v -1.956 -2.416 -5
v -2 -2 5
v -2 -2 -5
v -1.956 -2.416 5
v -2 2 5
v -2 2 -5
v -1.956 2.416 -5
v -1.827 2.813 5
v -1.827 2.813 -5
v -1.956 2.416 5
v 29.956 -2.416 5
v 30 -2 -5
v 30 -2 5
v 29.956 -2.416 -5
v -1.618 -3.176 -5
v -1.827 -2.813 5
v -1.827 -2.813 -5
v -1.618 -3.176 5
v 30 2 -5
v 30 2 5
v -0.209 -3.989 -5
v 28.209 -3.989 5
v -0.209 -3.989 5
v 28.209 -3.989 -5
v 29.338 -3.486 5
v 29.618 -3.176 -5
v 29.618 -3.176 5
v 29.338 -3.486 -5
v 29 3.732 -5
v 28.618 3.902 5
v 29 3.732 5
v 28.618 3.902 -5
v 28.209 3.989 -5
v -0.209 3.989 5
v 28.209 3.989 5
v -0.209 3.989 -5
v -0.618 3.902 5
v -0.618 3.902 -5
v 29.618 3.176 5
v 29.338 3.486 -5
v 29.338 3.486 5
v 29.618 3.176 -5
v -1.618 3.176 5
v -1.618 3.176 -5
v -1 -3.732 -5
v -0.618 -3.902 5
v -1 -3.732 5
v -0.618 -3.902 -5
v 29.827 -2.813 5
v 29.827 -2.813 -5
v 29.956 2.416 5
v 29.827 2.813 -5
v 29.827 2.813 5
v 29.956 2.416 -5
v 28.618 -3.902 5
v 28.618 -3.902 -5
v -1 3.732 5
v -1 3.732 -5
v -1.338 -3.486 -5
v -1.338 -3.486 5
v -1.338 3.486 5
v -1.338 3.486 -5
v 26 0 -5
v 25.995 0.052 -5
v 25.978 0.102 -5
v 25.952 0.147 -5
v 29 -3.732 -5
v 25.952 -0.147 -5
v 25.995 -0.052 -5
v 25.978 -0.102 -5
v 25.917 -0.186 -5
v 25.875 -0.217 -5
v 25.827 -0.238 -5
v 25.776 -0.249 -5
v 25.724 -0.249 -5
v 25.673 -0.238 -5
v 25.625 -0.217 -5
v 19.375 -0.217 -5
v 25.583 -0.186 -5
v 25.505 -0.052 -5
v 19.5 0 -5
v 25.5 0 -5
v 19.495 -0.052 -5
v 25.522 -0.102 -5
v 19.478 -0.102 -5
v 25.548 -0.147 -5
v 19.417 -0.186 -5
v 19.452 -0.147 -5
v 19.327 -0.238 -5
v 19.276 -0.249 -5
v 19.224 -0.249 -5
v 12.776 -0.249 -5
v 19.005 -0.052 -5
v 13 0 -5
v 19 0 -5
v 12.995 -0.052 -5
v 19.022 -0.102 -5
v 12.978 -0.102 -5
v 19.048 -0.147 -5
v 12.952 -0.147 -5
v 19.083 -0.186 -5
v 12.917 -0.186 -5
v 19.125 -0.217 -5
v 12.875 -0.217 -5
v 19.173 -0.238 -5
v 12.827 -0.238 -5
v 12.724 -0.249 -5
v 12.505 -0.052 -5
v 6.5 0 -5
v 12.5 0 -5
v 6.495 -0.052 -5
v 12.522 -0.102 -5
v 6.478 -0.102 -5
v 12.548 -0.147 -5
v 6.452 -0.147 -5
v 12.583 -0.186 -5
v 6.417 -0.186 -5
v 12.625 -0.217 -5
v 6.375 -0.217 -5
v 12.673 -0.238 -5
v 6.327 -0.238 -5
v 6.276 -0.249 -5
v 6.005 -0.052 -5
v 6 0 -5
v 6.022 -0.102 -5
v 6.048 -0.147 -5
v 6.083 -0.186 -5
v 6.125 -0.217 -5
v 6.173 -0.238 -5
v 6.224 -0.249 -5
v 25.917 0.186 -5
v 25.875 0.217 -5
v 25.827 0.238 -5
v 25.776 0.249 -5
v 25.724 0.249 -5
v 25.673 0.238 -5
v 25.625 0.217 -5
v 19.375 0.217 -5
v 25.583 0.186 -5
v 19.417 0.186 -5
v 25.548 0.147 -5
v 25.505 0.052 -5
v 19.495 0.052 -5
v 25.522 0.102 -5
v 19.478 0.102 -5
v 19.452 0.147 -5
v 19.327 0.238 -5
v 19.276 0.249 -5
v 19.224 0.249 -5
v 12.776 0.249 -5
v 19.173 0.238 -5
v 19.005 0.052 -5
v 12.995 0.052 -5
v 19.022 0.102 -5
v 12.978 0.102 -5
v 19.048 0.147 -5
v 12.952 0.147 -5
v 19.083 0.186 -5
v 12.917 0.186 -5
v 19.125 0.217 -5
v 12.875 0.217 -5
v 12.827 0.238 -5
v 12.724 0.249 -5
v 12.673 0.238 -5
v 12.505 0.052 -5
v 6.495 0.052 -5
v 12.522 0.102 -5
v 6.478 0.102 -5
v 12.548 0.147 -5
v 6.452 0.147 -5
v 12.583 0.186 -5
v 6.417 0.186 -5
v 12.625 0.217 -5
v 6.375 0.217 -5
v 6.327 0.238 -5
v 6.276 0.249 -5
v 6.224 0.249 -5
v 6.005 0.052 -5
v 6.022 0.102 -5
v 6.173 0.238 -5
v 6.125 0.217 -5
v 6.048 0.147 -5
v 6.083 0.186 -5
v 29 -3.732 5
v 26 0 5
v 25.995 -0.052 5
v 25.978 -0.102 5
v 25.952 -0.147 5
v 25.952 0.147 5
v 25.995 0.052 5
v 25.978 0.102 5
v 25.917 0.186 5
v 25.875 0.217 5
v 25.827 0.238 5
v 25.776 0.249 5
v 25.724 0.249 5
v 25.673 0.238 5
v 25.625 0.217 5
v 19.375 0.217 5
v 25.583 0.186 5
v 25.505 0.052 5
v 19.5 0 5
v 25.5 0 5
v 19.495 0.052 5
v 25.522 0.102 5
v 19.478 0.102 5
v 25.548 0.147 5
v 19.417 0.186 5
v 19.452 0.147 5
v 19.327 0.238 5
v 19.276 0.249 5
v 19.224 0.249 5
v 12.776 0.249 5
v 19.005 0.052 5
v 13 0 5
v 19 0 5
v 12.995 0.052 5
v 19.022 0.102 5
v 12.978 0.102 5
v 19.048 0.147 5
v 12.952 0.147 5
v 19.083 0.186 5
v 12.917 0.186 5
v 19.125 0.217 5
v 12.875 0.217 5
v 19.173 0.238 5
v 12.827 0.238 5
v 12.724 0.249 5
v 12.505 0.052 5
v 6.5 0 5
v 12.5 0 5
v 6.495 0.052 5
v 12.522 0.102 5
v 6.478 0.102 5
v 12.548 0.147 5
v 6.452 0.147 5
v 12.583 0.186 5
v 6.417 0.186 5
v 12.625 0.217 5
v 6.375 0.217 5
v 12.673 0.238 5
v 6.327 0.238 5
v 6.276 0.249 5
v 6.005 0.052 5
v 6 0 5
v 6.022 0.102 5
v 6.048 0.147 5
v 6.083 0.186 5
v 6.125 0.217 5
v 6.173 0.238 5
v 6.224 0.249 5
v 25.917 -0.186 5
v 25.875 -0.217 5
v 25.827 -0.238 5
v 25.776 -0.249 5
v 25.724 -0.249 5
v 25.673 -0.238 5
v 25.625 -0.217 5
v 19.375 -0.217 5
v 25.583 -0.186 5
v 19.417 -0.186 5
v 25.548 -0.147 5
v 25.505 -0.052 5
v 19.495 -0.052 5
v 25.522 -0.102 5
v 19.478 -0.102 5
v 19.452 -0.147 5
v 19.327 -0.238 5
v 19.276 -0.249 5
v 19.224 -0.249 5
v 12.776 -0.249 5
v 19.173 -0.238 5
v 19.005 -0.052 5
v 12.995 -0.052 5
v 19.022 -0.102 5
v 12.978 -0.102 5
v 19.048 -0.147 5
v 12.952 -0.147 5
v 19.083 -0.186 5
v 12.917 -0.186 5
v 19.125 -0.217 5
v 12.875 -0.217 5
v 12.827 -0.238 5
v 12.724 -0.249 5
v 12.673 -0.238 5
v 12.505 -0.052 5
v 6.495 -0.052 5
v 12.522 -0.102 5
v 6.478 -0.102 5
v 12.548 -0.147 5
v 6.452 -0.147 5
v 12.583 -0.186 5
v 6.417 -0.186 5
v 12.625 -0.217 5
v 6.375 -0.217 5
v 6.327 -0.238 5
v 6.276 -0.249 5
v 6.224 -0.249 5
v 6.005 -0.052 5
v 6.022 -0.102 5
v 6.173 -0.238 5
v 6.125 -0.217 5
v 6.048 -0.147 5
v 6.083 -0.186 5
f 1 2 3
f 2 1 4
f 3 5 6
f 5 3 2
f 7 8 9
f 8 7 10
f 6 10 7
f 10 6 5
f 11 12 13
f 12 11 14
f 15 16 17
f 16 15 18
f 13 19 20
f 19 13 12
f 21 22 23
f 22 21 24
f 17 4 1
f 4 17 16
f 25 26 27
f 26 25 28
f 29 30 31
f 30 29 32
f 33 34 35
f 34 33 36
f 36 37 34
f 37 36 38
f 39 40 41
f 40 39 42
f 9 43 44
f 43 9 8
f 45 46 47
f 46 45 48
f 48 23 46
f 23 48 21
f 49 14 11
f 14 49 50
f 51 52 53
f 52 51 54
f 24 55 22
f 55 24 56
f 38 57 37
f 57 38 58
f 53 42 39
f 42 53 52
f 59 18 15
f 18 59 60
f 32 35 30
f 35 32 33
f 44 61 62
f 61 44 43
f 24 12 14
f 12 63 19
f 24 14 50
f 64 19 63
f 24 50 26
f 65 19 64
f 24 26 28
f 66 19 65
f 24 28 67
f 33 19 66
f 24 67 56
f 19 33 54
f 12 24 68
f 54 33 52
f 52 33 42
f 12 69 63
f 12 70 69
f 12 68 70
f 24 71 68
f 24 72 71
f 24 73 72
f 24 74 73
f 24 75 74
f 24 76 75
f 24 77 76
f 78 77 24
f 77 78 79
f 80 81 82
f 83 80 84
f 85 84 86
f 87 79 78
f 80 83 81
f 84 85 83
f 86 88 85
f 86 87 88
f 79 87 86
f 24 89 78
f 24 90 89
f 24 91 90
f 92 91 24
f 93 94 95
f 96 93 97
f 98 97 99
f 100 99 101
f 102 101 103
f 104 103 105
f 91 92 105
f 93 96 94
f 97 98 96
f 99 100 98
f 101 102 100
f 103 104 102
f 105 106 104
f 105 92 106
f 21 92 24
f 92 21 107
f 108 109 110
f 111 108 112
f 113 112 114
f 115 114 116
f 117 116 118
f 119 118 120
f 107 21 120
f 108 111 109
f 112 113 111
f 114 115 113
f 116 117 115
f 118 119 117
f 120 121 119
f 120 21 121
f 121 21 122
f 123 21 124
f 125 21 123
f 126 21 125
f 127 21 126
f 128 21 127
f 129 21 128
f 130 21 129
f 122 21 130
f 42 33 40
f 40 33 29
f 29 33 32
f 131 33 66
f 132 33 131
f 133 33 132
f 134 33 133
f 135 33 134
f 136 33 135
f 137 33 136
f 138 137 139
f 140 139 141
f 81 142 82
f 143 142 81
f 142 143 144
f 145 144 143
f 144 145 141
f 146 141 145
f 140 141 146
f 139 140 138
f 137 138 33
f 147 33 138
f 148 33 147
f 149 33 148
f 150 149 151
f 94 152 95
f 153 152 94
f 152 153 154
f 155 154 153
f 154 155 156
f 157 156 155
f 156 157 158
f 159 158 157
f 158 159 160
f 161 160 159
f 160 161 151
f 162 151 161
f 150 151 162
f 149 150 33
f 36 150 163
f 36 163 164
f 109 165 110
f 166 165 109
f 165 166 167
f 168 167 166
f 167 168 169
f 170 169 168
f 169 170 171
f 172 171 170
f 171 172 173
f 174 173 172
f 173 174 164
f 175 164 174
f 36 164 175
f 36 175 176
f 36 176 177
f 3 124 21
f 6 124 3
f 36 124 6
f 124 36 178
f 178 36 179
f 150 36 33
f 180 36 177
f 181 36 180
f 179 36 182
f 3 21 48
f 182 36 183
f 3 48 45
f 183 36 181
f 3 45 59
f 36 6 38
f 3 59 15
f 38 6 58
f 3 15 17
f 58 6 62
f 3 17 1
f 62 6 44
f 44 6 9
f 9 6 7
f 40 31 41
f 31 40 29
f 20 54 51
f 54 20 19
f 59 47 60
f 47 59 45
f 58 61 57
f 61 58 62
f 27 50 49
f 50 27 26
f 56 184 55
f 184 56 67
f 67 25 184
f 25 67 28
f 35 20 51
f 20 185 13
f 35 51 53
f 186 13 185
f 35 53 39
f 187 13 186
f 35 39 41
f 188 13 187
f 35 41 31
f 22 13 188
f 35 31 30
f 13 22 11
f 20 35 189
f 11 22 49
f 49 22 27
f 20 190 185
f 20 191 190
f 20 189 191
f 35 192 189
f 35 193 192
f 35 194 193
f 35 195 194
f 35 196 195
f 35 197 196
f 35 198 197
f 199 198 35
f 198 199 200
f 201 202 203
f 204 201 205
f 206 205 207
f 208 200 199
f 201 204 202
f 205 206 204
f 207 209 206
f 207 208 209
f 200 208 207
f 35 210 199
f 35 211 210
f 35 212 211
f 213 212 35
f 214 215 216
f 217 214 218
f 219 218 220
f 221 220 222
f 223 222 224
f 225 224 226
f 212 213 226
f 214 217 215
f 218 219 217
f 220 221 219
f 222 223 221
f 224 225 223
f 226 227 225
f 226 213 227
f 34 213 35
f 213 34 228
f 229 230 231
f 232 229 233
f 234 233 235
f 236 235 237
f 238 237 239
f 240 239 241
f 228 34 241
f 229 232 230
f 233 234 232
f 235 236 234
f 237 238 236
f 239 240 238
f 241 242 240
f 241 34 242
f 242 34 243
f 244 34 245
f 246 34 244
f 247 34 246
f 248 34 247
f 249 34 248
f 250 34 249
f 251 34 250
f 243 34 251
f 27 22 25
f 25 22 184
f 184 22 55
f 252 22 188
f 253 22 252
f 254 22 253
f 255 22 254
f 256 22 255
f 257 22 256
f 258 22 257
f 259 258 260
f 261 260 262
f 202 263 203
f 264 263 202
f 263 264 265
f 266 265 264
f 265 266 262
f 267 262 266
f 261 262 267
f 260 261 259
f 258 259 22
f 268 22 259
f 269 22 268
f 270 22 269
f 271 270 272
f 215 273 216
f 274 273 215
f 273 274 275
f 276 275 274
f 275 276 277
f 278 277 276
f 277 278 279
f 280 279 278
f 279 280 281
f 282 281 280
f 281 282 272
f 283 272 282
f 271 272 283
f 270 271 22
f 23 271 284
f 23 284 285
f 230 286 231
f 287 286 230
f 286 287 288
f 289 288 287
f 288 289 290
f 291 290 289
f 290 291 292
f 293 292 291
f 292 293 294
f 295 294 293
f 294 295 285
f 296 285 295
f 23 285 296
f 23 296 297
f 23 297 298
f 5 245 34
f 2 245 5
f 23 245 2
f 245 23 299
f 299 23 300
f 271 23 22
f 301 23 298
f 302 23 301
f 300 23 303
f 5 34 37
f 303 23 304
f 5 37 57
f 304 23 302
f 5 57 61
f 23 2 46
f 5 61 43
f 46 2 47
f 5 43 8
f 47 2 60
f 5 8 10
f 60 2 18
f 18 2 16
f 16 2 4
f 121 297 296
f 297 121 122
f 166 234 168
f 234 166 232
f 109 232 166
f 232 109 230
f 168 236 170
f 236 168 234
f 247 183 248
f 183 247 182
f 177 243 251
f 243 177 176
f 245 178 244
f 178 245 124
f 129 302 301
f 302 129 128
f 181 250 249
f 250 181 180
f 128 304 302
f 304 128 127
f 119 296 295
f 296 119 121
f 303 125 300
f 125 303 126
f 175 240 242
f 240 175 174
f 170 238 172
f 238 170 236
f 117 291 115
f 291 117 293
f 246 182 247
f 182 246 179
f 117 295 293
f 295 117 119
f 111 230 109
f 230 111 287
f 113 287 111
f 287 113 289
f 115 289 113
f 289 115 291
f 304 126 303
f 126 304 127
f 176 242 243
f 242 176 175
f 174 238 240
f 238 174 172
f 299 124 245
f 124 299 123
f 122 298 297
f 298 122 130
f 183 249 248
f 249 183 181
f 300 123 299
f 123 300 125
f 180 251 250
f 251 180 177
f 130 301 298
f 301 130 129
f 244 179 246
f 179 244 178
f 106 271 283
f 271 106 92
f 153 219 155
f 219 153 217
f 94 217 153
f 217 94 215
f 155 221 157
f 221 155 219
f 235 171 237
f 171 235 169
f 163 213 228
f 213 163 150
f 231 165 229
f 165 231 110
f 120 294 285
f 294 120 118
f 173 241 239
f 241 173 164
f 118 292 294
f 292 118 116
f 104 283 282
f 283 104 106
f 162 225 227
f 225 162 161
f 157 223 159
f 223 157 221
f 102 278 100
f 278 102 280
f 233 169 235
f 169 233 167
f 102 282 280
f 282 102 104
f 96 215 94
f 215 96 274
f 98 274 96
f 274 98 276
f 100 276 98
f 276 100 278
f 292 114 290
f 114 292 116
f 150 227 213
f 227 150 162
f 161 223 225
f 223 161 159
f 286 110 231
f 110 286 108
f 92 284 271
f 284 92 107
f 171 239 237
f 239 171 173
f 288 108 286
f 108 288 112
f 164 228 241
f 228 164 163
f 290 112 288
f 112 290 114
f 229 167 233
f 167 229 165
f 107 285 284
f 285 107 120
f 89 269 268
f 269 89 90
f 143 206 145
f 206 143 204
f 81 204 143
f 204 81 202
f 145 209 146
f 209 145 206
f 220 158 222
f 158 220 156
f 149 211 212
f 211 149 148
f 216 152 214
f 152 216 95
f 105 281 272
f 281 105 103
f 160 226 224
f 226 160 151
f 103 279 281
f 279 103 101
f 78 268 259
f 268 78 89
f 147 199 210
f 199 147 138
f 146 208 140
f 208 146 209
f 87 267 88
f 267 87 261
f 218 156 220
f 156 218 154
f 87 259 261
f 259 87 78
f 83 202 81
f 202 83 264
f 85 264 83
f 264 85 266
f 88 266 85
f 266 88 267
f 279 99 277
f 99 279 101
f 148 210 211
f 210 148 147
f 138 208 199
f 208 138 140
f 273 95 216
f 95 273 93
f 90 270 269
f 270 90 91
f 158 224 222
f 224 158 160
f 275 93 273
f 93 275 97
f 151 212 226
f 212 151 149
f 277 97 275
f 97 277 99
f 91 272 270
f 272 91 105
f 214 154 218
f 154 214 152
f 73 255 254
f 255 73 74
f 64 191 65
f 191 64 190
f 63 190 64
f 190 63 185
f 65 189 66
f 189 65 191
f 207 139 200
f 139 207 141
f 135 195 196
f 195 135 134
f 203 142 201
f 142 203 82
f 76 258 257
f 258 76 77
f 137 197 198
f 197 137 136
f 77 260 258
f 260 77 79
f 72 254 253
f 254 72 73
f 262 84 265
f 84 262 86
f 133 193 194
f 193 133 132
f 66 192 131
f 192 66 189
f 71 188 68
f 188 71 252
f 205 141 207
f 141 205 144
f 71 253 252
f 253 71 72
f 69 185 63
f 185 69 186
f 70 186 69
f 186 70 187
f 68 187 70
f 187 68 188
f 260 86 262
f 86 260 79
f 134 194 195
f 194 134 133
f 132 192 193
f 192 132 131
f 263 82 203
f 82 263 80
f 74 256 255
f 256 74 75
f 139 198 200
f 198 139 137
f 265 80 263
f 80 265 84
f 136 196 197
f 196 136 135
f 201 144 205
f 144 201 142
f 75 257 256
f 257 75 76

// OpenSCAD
$fn=30;
height=10;
radius=2;
difference(){
    hull(){
        translate([0,-2,0])cylinder(r=radius,h=height, center=true);
        translate([28,2,0])cylinder(r=radius,h=height, center=true);
        translate([0,2,0])cylinder(r=radius,h=height, center=true);
        translate([28,-2,0])cylinder(r=radius,h=height, center=true);
  }
    translate([6.25,0,0])cylinder(d=radius/4,h=height*10, center=true);
    translate([12.75,0,0])cylinder(d=radius/4,h=height*10, center=true);
    translate([19.25,0,0])cylinder(d=radius/4,h=height*10, center=true);
    translate([25.75,0,0])cylinder(d=radius/4,h=height*10, center=true);
}
  
